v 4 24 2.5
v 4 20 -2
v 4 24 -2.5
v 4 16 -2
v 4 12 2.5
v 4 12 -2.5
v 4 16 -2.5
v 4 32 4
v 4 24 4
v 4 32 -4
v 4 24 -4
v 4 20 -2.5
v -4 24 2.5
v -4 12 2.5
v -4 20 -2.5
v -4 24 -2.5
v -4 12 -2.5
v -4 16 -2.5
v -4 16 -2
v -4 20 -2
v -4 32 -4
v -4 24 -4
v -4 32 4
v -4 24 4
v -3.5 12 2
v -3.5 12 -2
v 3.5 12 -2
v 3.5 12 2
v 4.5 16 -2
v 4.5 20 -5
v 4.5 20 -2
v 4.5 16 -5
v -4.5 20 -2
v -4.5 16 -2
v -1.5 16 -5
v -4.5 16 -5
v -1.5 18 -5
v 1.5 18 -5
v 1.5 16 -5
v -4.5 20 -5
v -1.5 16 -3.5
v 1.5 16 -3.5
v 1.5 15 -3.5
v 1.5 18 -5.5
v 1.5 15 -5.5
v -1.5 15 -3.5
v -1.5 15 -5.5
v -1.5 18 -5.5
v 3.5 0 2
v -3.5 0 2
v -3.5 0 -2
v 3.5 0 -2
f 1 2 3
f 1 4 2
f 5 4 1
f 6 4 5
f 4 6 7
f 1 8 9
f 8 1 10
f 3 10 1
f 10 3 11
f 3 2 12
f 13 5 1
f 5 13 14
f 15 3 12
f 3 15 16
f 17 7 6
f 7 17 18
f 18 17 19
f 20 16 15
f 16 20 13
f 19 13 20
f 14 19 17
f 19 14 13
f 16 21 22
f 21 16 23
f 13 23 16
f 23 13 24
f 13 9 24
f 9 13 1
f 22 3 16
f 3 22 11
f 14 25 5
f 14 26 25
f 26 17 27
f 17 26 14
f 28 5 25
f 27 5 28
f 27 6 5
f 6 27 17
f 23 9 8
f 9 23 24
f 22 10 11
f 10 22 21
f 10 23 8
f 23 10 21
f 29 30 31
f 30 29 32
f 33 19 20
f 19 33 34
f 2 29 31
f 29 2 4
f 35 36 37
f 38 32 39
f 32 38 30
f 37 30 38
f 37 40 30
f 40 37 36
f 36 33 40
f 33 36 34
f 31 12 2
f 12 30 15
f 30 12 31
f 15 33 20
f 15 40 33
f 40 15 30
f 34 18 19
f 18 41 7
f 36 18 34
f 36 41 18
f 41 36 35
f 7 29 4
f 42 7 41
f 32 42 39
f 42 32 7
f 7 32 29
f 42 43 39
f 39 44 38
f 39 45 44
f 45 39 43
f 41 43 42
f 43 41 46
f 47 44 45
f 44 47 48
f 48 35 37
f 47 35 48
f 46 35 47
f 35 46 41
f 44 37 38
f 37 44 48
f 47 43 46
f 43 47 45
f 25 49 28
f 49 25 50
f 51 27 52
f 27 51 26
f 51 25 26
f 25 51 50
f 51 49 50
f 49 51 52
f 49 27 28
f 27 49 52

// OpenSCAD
// file: lib.scad
// Voxcraft box-model library (OpenSCAD).
//
// Conventions: 1 unit = 1 texture pixel = 1/16 block. Origin = entity feet centre. +Y up,
// the model faces -Z (forward). Pivots are in model space.
//
// vx_bone() and vx_box() both produce geometry (so the model can be previewed/rendered and its
// geometry validated) AND echo a machine-readable record that tools/scad_export.py turns into
// the runtime box model. The .scad files are the single editable source of truth.

// Declare a bone: name, parent ("" = root), pivot point the bone rotates around.
module vx_bone(name, parent, pivot) {
    echo("VXBONE", name, parent, pivot);
    %translate(pivot) sphere(0.5, $fn = 6);   // preview-only marker
}

// A textured box attached to a bone. tex: texture for all faces; front: texture for the -Z face.
module vx_box(bone, min, size, tex, front = "") {
    echo("VXBOX", bone, min, size, tex, front == "" ? tex : front);
    translate(min) cube(size);
}
// main file
// Settler: a robed, hooded villager who trades with travellers. Original Voxcraft creature.
include <lib.scad>

vx_bone("body", "", [0, 12, 0]);
vx_bone("head", "body", [0, 24, 0]);
vx_bone("arms", "body", [0, 21, 0]);
vx_bone("leg_l", "body", [-2, 12, 0]);
vx_bone("leg_r", "body", [ 2, 12, 0]);

vx_box("body", [-4, 12, -2.5], [8, 12, 5], "settler_robe");
vx_box("head", [-4, 24, -4], [8, 8, 8], "settler_hood", "settler_face");
vx_box("arms", [-4.5, 16, -5], [9, 4, 3], "settler_robe");
vx_box("arms", [-1.5, 15, -5.5], [3, 3, 2], "settler_hands");
vx_box("leg_l", [-3.5, 0, -2], [3.5, 12, 4], "settler_robe");
vx_box("leg_r", [ 0, 0, -2], [3.5, 12, 4], "settler_robe");
